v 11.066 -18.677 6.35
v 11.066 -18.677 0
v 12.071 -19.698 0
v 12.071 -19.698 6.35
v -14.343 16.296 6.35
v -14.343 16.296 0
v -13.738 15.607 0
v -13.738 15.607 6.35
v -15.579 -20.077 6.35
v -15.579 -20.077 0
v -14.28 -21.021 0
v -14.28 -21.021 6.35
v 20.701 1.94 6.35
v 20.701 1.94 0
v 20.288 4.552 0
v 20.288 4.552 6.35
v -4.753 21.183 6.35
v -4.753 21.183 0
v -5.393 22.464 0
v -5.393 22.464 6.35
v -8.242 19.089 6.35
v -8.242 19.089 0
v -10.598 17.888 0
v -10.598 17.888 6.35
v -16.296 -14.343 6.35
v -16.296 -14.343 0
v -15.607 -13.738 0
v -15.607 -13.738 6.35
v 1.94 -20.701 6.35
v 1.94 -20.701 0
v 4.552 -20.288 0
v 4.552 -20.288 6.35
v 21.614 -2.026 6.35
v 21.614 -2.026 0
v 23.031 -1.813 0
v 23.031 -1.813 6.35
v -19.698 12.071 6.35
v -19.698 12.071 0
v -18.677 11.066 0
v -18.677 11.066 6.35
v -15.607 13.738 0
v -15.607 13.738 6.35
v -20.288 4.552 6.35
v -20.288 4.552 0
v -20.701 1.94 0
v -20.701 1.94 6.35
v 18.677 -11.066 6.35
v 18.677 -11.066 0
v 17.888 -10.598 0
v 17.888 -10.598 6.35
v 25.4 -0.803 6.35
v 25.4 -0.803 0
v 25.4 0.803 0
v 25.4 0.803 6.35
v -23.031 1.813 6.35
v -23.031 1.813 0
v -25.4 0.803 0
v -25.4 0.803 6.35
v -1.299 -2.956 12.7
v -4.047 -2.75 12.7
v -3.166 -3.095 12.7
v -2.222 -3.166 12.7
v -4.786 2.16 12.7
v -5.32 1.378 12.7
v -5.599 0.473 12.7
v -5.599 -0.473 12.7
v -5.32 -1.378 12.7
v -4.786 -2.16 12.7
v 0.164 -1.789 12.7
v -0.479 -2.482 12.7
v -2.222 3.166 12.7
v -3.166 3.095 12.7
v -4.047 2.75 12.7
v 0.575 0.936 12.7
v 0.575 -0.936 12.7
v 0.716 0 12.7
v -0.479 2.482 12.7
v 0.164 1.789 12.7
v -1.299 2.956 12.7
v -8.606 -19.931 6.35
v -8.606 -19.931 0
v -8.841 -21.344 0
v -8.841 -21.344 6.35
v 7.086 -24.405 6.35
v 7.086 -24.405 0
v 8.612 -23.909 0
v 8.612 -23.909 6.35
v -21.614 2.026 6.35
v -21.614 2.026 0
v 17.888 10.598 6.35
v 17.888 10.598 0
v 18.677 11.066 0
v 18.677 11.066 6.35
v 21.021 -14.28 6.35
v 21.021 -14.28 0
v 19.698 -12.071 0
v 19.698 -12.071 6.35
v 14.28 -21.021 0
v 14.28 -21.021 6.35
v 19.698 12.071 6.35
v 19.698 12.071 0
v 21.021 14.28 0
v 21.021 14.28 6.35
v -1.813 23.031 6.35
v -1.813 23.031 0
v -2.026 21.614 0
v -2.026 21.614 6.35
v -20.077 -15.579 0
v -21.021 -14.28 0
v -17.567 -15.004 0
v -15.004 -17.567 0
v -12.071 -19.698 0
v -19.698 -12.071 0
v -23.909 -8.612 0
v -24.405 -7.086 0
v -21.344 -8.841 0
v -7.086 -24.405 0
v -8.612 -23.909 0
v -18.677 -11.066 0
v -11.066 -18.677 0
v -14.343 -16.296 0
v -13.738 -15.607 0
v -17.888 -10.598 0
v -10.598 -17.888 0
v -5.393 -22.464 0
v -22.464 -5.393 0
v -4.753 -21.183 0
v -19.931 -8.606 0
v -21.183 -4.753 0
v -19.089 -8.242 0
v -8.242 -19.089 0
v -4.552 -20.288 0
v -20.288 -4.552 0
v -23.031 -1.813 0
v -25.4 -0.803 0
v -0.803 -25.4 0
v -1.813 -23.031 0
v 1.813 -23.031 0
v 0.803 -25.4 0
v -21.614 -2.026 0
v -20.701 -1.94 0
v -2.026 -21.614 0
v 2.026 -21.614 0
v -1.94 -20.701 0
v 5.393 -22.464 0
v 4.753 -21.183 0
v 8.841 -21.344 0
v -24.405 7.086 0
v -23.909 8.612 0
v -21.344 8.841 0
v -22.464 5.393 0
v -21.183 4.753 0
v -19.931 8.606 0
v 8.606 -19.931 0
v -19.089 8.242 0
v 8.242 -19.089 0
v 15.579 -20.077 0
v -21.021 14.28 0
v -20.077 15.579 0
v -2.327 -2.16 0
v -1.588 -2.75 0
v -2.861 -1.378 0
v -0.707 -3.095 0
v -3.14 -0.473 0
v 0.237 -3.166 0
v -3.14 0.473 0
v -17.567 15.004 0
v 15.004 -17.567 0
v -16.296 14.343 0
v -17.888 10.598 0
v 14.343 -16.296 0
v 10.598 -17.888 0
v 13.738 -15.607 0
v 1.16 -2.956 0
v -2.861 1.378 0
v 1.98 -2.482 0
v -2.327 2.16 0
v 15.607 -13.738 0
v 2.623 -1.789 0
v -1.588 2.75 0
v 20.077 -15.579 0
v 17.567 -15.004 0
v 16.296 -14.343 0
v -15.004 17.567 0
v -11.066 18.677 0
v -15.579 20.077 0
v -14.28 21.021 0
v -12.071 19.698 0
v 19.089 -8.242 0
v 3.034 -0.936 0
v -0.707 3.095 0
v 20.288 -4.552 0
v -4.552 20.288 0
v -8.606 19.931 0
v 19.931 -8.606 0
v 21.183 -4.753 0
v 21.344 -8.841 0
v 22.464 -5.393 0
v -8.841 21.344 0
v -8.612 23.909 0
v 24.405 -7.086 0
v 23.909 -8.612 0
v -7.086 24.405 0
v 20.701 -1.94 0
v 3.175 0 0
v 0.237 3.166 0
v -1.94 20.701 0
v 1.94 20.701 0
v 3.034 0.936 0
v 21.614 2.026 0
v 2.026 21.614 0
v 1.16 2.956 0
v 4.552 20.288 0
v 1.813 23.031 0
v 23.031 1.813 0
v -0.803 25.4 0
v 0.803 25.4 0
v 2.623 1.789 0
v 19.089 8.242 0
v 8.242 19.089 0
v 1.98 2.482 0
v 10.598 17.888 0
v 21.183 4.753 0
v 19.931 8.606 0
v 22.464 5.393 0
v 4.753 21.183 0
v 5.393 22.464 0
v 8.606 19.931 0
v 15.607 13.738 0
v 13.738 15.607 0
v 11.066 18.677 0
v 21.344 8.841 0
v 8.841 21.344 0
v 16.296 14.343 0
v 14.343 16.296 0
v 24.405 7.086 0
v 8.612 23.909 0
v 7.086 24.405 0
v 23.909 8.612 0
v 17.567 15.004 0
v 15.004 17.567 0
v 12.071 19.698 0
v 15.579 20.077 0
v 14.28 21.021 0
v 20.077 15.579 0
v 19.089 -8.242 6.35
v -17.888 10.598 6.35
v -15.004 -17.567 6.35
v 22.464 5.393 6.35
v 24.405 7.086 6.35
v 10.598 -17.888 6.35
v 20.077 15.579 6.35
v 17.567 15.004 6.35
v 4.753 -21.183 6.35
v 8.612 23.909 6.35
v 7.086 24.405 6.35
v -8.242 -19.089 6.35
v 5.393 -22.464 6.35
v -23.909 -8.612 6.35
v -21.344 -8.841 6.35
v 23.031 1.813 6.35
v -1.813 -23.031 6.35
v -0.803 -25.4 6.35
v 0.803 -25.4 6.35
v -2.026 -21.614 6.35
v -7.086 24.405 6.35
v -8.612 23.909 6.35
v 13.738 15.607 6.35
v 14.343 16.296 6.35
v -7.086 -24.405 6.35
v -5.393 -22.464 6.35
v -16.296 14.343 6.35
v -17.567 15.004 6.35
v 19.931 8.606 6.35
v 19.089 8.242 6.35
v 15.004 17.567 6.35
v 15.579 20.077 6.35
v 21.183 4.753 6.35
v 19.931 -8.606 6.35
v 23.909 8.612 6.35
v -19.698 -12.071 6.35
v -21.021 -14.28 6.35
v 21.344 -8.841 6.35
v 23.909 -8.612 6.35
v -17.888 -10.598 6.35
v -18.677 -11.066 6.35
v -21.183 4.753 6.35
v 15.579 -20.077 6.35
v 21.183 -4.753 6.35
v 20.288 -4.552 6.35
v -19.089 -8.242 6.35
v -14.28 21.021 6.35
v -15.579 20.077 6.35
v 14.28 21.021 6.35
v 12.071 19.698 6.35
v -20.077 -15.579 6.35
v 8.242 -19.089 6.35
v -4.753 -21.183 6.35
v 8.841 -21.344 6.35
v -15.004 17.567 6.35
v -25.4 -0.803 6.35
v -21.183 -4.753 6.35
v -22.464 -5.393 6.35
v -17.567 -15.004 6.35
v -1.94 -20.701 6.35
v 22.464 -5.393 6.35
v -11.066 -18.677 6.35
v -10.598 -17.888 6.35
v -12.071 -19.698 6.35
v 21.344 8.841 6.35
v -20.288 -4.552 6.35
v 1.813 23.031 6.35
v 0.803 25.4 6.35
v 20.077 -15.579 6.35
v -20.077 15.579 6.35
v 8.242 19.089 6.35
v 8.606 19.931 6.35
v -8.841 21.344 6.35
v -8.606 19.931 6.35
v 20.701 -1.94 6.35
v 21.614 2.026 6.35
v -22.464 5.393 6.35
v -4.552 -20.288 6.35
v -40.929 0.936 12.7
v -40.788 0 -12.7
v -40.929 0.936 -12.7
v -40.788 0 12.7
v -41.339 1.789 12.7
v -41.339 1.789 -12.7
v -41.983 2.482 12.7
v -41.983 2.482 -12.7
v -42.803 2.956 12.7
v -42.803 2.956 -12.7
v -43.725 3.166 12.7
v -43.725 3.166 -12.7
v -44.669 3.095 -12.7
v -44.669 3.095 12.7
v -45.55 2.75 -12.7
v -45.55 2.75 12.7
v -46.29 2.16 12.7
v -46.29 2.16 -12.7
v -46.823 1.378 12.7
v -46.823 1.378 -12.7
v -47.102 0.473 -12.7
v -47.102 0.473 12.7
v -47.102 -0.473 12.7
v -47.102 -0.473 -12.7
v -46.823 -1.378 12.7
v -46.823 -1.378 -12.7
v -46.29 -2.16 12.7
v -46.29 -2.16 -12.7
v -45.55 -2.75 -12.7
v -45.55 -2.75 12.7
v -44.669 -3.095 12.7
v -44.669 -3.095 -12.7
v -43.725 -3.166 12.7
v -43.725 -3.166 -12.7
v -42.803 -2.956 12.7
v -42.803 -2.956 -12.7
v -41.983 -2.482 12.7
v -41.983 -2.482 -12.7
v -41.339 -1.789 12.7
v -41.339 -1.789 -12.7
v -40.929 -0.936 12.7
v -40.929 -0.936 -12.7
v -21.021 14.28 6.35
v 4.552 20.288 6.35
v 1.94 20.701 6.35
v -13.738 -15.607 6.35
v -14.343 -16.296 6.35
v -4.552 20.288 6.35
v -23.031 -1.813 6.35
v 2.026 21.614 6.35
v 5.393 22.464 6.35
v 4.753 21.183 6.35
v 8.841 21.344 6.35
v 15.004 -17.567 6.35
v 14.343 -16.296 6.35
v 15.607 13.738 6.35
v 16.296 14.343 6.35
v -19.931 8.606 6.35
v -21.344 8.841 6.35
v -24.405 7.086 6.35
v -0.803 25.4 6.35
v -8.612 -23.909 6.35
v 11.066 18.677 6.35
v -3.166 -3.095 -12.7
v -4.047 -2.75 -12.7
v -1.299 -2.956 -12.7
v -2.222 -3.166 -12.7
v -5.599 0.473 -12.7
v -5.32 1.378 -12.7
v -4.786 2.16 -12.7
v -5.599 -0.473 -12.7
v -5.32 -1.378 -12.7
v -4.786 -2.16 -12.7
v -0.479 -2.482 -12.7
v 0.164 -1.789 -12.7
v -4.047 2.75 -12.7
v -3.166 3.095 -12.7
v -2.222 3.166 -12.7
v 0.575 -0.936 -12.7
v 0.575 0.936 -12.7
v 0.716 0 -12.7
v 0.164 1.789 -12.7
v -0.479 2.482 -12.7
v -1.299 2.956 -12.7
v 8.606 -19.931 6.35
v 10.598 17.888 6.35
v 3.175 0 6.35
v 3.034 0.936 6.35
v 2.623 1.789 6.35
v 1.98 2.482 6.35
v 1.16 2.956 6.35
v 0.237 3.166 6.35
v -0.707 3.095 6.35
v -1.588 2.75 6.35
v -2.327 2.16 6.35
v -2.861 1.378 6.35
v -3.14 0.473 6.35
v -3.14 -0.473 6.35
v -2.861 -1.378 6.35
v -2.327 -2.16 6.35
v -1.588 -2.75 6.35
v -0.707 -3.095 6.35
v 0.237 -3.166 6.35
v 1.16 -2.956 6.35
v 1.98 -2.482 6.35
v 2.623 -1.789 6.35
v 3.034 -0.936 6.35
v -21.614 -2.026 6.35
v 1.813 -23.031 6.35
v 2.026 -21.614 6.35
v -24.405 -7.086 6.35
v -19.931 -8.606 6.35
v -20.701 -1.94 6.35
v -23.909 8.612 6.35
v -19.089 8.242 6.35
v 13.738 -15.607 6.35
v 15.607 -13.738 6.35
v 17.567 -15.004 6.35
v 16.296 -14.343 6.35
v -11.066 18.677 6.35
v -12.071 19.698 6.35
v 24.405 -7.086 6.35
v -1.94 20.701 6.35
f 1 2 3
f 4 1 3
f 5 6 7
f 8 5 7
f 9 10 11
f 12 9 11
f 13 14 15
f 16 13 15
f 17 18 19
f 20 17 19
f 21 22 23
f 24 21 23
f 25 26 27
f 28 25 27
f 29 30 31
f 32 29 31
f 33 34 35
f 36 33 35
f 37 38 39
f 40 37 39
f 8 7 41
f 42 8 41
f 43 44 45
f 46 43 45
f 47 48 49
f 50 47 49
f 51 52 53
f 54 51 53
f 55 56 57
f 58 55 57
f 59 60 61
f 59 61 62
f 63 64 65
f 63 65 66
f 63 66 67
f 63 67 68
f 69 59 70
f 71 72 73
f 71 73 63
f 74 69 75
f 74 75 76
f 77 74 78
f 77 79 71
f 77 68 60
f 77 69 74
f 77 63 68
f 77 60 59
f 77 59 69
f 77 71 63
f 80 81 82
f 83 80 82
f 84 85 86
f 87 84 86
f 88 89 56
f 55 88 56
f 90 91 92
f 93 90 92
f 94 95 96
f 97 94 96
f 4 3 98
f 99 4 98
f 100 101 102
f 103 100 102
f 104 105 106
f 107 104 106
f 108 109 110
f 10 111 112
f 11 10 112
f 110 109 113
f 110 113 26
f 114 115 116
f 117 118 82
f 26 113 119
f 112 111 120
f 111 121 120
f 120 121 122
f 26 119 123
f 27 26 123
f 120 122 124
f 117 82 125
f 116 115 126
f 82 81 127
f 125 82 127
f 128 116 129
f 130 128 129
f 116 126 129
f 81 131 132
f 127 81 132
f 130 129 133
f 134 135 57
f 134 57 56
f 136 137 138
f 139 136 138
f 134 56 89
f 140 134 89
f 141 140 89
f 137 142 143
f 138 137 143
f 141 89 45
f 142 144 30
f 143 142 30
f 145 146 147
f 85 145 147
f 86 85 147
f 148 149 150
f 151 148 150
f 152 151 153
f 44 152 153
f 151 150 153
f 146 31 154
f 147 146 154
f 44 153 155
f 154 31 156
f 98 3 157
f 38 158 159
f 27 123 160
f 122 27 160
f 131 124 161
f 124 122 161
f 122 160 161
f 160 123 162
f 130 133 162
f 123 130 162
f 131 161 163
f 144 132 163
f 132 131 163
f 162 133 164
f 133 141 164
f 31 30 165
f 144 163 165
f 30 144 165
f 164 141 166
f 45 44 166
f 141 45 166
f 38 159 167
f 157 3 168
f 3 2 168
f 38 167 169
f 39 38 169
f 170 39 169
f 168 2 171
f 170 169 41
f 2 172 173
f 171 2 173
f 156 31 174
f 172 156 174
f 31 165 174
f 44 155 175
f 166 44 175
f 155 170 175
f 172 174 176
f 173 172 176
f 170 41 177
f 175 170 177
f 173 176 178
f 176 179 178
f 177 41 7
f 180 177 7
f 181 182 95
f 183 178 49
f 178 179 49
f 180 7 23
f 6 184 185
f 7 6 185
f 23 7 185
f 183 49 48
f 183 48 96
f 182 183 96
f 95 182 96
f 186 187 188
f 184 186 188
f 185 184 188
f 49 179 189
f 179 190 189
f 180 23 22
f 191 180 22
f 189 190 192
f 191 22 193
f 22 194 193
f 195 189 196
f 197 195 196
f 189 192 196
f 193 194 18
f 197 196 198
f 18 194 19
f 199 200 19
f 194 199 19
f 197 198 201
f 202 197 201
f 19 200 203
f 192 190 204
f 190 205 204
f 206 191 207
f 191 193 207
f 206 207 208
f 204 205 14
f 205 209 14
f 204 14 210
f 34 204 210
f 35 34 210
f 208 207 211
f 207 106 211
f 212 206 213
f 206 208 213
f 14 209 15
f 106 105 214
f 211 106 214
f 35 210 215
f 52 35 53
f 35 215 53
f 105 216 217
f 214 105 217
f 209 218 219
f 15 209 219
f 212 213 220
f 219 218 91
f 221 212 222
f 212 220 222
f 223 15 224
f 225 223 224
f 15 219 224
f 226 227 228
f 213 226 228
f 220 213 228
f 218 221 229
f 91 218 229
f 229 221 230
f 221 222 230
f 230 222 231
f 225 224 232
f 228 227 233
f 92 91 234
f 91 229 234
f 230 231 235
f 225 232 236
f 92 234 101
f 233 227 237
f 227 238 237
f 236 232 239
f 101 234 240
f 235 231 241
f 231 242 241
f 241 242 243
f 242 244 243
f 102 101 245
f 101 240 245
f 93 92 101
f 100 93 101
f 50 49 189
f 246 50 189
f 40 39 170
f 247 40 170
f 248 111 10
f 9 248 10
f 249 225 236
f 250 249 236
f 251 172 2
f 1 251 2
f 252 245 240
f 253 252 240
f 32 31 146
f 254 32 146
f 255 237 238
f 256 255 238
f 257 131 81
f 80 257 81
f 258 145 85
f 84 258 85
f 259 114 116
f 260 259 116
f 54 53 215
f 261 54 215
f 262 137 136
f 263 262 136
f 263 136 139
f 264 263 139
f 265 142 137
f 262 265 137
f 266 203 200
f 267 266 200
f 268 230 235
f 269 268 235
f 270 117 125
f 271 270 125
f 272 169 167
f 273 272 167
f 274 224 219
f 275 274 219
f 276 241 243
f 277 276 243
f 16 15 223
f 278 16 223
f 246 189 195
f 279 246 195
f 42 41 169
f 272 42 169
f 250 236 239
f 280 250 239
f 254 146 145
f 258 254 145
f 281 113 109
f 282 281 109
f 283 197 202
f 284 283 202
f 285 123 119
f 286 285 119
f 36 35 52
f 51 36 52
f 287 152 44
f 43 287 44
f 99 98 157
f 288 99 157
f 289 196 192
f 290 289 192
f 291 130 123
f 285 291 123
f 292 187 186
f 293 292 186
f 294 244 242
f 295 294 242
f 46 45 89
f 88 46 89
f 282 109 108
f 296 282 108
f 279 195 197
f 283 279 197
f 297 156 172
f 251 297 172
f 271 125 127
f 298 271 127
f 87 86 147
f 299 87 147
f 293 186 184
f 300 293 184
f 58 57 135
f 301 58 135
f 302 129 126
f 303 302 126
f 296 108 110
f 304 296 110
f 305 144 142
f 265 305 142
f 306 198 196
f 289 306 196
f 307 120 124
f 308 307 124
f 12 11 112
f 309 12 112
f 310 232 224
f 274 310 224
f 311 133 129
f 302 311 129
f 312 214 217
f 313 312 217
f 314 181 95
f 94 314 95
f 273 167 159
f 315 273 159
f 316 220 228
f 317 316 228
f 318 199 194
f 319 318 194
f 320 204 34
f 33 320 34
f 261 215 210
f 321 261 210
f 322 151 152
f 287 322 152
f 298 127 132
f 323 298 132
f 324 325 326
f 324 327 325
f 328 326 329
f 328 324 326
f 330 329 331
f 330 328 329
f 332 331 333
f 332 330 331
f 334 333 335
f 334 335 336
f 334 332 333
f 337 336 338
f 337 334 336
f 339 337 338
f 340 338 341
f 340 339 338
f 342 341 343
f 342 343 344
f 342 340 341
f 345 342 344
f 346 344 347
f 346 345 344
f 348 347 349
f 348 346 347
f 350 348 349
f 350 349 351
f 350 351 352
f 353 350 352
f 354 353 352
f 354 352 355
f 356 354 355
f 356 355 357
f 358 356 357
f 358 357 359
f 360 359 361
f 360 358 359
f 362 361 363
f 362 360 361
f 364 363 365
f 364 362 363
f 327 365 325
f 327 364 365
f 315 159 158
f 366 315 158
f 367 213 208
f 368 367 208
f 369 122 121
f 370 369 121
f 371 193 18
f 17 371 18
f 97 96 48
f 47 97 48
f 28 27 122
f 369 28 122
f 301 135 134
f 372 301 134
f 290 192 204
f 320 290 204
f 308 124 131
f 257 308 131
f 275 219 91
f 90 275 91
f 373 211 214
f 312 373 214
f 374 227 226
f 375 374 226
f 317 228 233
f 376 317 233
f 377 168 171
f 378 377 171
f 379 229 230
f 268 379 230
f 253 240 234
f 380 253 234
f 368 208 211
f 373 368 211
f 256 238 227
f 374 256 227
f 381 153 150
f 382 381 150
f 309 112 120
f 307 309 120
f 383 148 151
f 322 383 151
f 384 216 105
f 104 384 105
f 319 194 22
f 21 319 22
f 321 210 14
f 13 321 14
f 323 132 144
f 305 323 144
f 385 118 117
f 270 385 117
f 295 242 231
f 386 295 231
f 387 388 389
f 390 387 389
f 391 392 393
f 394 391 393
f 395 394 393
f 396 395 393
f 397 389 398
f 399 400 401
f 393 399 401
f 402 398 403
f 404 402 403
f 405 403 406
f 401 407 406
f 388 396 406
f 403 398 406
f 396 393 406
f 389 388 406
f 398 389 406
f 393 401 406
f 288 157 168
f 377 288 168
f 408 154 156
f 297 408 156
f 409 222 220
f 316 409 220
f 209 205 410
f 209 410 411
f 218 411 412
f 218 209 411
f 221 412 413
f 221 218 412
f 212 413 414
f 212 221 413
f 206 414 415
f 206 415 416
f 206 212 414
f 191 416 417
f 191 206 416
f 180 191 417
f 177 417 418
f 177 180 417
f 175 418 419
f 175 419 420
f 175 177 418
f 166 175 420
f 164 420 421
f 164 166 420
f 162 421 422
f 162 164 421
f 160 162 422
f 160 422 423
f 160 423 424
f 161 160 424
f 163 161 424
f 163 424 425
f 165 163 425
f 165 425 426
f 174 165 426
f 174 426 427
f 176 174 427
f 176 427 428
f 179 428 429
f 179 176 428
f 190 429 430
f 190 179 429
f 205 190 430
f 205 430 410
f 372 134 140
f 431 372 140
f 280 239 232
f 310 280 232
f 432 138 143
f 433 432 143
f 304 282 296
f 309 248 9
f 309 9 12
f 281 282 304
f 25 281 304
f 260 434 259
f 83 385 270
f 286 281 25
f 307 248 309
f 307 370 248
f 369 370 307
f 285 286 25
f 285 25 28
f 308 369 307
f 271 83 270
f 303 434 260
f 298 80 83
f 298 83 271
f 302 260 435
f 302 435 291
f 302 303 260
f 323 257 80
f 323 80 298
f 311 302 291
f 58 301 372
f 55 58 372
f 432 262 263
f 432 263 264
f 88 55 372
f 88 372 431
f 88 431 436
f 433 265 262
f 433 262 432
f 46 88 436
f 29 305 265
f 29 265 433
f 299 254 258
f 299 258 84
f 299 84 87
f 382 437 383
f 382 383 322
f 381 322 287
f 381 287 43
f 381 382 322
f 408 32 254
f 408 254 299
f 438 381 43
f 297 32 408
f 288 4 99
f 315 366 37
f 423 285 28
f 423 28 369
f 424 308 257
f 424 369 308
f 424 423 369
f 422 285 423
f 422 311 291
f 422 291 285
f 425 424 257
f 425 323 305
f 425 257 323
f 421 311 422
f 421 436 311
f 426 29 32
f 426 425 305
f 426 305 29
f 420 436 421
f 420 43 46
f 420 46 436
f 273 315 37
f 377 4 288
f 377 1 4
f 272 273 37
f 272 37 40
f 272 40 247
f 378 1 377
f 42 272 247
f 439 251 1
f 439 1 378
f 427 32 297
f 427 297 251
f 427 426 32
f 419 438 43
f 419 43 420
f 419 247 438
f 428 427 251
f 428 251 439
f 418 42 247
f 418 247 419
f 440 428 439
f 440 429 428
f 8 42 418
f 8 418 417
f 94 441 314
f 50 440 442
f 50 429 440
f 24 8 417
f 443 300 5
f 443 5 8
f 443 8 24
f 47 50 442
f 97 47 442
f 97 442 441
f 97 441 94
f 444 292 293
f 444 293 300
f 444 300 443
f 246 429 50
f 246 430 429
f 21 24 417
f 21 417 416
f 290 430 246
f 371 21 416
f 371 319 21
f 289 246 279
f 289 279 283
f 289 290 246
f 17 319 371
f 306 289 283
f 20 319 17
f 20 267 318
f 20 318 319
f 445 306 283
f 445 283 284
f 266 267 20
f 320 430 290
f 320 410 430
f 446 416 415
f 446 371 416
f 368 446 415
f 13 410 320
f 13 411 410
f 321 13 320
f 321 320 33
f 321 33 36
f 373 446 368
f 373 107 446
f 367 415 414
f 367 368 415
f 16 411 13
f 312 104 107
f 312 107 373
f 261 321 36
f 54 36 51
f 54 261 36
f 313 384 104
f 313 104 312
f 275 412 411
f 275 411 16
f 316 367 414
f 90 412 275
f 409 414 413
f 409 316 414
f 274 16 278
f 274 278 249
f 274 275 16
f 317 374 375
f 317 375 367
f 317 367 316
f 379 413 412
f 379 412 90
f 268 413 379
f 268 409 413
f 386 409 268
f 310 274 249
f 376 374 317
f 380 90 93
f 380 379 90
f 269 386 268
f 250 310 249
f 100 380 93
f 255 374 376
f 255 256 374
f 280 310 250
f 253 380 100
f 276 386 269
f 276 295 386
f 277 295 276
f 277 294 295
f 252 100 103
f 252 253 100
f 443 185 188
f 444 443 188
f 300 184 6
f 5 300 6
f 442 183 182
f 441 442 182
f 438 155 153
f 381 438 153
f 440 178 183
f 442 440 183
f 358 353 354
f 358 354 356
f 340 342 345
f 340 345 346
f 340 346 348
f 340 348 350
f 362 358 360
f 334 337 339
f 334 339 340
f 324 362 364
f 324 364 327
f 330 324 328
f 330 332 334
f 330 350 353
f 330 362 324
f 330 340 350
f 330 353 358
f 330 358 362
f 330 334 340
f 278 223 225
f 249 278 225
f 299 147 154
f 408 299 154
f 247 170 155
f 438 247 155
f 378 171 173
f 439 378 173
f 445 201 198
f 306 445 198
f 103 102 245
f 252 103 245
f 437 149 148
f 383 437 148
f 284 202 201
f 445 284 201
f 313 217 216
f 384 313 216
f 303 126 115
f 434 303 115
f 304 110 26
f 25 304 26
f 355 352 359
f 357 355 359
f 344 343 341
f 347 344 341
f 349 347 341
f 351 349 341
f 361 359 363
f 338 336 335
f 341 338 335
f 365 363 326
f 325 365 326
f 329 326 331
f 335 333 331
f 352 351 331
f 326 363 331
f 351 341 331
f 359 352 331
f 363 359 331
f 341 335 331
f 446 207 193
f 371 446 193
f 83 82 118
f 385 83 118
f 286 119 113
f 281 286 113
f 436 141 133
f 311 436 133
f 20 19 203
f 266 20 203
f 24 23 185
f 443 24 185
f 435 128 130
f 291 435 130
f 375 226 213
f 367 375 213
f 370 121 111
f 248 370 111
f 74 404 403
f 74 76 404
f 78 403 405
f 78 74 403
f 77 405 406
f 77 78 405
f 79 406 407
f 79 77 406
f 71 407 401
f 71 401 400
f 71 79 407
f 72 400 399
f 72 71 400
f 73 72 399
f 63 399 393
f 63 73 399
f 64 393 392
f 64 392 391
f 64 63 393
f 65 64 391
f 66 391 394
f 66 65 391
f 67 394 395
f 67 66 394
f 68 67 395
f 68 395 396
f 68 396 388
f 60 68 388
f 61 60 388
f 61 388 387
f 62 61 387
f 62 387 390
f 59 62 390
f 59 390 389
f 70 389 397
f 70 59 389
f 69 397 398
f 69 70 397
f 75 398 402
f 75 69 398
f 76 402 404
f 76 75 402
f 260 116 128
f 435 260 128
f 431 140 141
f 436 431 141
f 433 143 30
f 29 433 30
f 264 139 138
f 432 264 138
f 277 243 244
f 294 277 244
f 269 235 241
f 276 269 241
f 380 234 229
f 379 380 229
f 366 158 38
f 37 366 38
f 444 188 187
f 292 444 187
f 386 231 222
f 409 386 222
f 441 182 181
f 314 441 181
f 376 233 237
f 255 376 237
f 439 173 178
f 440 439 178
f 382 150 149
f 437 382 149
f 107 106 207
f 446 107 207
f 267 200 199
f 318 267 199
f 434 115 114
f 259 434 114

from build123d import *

# Parameters (mm, degrees)
F0_R          = 3.175
F1_DEPTH      = 6.35
F2_R          = 3.175
F3_DEPTH      = 12.7
F3_DEPTH_BACK = 12.7


with BuildPart() as f1:
    # F0 (on Top) → F1 (new body)
    with BuildSketch(Plane.XY):
        Polygon((21.614472, 2.025642), (20.701479, 1.940085), (20.287793, 4.551981), (21.182545, 4.752731), (22.464108, 5.393158), (24.404836, 7.085775), (23.908842, 8.612293), (21.343866, 8.840921), (19.930626, 8.60574), (19.088759, 8.242232), (17.888197, 10.59846), (18.677125, 11.065886), (19.698059, 12.07099), (21.020753, 14.280475), (20.077314, 15.579009), (17.567229, 15.003827), (16.295836, 14.343446), (15.607495, 13.737579), (13.737588, 15.607495), (14.343455, 16.295827), (15.003827, 17.567229), (15.579009, 20.077314), (14.280484, 21.020753), (12.07099, 19.698059), (11.065886, 18.677116), (10.59846, 17.888197), (8.242242, 19.088759), (8.60574, 19.930626), (8.840921, 21.343866), (8.612293, 23.908833), (7.085775, 24.404836), (5.393158, 22.464108), (4.75274, 21.182545), (4.551981, 20.287793), (1.940085, 20.701479), (2.025651, 21.614472), (1.812596, 23.031218), (0.80254, 25.4), (-0.80254, 25.4), (-1.812596, 23.031218), (-2.025651, 21.614472), (-1.940085, 20.701479), (-4.551981, 20.287793), (-4.75274, 21.182545), (-5.393158, 22.464108), (-7.085775, 24.404836), (-8.612293, 23.908833), (-8.840921, 21.343866), (-8.60574, 19.930626), (-8.242242, 19.088759), (-10.59846, 17.888197), (-11.065886, 18.677116), (-12.07099, 19.698059), (-14.280484, 21.020753), (-15.579009, 20.077314), (-15.003827, 17.567229), (-14.343455, 16.295827), (-13.737588, 15.607495), (-15.607495, 13.737579), (-16.295836, 14.343446), (-17.567229, 15.003827), (-20.077314, 15.579009), (-21.020753, 14.280475), (-19.698059, 12.07099), (-18.677125, 11.065886), (-17.888197, 10.59846), (-19.088759, 8.242232), (-19.930626, 8.60574), (-21.343866, 8.840921), (-23.908842, 8.612293), (-24.404836, 7.085775), (-22.464108, 5.393158), (-21.182545, 4.752731), (-20.287793, 4.551981), (-20.701479, 1.940085), (-21.614472, 2.025642), (-23.031218, 1.812596), (-25.4, 0.802531), (-25.4, -0.80254), (-23.031218, -1.812596), (-21.614472, -2.025651), (-20.701479, -1.940085), (-20.287793, -4.551981), (-21.182545, -4.75274), (-22.464108, -5.393158), (-24.404836, -7.085775), (-23.908842, -8.612293), (-21.343866, -8.840921), (-19.930626, -8.605749), (-19.088759, -8.242242), (-17.888197, -10.59847), (-18.677125, -11.065886), (-19.698059, -12.07099), (-21.020753, -14.280484), (-20.077314, -15.579018), (-17.567229, -15.003836), (-16.295836, -14.343455), (-15.607495, -13.737588), (-13.737588, -15.607495), (-14.343455, -16.295836), (-15.003827, -17.567229), (-15.579009, -20.077314), (-14.280484, -21.020753), (-12.07099, -19.698069), (-11.065886, -18.677125), (-10.59846, -17.888206), (-8.242242, -19.088759), (-8.60574, -19.930626), (-8.840921, -21.343866), (-8.612293, -23.908842), (-7.085775, -24.404836), (-5.393158, -22.464117), (-4.75274, -21.182545), (-4.551981, -20.287802), (-1.940085, -20.701479), (-2.025651, -21.614481), (-1.812596, -23.031218), (-0.80254, -25.4), (0.80254, -25.4), (1.812596, -23.031218), (2.025651, -21.614481), (1.940085, -20.701479), (4.551981, -20.287802), (4.75274, -21.182545), (5.393158, -22.464117), (7.085775, -24.404836), (8.612293, -23.908842), (8.840921, -21.343866), (8.60574, -19.930626), (8.242242, -19.088759), (10.59846, -17.888206), (11.065886, -18.677125), (12.07099, -19.698069), (14.280484, -21.020753), (15.579009, -20.077314), (15.003827, -17.567229), (14.343455, -16.295836), (13.737588, -15.607495), (15.607495, -13.737588), (16.295836, -14.343455), (17.567229, -15.003836), (20.077314, -15.579018), (21.020753, -14.280484), (19.698059, -12.07099), (18.677125, -11.065886), (17.888197, -10.59847), (19.088759, -8.242242), (19.930626, -8.605749), (21.343866, -8.840921), (23.908842, -8.612293), (24.404836, -7.085775), (22.464108, -5.393158), (21.182545, -4.75274), (20.287793, -4.551981), (20.701479, -1.940085), (21.614472, -2.025651), (23.031218, -1.812596), (25.4, -0.80254), (25.4, 0.802531), (23.031218, 1.812596), align=None)
        Circle(F0_R, mode=Mode.SUBTRACT)
    extrude(amount=F1_DEPTH)


with BuildPart() as f3:
    # F2 (on Top) → F3 (new body, two sides)
    with BuildSketch(Plane.XY) as f3_sk:
        with Locations((-43.962646, 0)):
            Circle(F2_R)
        with Locations((-2.459046, 0)):
            Circle(F2_R)
    extrude(amount=F3_DEPTH)
    extrude(f3_sk.sketch, amount=-F3_DEPTH_BACK)


solid = Compound([f1.part, f3.part])
